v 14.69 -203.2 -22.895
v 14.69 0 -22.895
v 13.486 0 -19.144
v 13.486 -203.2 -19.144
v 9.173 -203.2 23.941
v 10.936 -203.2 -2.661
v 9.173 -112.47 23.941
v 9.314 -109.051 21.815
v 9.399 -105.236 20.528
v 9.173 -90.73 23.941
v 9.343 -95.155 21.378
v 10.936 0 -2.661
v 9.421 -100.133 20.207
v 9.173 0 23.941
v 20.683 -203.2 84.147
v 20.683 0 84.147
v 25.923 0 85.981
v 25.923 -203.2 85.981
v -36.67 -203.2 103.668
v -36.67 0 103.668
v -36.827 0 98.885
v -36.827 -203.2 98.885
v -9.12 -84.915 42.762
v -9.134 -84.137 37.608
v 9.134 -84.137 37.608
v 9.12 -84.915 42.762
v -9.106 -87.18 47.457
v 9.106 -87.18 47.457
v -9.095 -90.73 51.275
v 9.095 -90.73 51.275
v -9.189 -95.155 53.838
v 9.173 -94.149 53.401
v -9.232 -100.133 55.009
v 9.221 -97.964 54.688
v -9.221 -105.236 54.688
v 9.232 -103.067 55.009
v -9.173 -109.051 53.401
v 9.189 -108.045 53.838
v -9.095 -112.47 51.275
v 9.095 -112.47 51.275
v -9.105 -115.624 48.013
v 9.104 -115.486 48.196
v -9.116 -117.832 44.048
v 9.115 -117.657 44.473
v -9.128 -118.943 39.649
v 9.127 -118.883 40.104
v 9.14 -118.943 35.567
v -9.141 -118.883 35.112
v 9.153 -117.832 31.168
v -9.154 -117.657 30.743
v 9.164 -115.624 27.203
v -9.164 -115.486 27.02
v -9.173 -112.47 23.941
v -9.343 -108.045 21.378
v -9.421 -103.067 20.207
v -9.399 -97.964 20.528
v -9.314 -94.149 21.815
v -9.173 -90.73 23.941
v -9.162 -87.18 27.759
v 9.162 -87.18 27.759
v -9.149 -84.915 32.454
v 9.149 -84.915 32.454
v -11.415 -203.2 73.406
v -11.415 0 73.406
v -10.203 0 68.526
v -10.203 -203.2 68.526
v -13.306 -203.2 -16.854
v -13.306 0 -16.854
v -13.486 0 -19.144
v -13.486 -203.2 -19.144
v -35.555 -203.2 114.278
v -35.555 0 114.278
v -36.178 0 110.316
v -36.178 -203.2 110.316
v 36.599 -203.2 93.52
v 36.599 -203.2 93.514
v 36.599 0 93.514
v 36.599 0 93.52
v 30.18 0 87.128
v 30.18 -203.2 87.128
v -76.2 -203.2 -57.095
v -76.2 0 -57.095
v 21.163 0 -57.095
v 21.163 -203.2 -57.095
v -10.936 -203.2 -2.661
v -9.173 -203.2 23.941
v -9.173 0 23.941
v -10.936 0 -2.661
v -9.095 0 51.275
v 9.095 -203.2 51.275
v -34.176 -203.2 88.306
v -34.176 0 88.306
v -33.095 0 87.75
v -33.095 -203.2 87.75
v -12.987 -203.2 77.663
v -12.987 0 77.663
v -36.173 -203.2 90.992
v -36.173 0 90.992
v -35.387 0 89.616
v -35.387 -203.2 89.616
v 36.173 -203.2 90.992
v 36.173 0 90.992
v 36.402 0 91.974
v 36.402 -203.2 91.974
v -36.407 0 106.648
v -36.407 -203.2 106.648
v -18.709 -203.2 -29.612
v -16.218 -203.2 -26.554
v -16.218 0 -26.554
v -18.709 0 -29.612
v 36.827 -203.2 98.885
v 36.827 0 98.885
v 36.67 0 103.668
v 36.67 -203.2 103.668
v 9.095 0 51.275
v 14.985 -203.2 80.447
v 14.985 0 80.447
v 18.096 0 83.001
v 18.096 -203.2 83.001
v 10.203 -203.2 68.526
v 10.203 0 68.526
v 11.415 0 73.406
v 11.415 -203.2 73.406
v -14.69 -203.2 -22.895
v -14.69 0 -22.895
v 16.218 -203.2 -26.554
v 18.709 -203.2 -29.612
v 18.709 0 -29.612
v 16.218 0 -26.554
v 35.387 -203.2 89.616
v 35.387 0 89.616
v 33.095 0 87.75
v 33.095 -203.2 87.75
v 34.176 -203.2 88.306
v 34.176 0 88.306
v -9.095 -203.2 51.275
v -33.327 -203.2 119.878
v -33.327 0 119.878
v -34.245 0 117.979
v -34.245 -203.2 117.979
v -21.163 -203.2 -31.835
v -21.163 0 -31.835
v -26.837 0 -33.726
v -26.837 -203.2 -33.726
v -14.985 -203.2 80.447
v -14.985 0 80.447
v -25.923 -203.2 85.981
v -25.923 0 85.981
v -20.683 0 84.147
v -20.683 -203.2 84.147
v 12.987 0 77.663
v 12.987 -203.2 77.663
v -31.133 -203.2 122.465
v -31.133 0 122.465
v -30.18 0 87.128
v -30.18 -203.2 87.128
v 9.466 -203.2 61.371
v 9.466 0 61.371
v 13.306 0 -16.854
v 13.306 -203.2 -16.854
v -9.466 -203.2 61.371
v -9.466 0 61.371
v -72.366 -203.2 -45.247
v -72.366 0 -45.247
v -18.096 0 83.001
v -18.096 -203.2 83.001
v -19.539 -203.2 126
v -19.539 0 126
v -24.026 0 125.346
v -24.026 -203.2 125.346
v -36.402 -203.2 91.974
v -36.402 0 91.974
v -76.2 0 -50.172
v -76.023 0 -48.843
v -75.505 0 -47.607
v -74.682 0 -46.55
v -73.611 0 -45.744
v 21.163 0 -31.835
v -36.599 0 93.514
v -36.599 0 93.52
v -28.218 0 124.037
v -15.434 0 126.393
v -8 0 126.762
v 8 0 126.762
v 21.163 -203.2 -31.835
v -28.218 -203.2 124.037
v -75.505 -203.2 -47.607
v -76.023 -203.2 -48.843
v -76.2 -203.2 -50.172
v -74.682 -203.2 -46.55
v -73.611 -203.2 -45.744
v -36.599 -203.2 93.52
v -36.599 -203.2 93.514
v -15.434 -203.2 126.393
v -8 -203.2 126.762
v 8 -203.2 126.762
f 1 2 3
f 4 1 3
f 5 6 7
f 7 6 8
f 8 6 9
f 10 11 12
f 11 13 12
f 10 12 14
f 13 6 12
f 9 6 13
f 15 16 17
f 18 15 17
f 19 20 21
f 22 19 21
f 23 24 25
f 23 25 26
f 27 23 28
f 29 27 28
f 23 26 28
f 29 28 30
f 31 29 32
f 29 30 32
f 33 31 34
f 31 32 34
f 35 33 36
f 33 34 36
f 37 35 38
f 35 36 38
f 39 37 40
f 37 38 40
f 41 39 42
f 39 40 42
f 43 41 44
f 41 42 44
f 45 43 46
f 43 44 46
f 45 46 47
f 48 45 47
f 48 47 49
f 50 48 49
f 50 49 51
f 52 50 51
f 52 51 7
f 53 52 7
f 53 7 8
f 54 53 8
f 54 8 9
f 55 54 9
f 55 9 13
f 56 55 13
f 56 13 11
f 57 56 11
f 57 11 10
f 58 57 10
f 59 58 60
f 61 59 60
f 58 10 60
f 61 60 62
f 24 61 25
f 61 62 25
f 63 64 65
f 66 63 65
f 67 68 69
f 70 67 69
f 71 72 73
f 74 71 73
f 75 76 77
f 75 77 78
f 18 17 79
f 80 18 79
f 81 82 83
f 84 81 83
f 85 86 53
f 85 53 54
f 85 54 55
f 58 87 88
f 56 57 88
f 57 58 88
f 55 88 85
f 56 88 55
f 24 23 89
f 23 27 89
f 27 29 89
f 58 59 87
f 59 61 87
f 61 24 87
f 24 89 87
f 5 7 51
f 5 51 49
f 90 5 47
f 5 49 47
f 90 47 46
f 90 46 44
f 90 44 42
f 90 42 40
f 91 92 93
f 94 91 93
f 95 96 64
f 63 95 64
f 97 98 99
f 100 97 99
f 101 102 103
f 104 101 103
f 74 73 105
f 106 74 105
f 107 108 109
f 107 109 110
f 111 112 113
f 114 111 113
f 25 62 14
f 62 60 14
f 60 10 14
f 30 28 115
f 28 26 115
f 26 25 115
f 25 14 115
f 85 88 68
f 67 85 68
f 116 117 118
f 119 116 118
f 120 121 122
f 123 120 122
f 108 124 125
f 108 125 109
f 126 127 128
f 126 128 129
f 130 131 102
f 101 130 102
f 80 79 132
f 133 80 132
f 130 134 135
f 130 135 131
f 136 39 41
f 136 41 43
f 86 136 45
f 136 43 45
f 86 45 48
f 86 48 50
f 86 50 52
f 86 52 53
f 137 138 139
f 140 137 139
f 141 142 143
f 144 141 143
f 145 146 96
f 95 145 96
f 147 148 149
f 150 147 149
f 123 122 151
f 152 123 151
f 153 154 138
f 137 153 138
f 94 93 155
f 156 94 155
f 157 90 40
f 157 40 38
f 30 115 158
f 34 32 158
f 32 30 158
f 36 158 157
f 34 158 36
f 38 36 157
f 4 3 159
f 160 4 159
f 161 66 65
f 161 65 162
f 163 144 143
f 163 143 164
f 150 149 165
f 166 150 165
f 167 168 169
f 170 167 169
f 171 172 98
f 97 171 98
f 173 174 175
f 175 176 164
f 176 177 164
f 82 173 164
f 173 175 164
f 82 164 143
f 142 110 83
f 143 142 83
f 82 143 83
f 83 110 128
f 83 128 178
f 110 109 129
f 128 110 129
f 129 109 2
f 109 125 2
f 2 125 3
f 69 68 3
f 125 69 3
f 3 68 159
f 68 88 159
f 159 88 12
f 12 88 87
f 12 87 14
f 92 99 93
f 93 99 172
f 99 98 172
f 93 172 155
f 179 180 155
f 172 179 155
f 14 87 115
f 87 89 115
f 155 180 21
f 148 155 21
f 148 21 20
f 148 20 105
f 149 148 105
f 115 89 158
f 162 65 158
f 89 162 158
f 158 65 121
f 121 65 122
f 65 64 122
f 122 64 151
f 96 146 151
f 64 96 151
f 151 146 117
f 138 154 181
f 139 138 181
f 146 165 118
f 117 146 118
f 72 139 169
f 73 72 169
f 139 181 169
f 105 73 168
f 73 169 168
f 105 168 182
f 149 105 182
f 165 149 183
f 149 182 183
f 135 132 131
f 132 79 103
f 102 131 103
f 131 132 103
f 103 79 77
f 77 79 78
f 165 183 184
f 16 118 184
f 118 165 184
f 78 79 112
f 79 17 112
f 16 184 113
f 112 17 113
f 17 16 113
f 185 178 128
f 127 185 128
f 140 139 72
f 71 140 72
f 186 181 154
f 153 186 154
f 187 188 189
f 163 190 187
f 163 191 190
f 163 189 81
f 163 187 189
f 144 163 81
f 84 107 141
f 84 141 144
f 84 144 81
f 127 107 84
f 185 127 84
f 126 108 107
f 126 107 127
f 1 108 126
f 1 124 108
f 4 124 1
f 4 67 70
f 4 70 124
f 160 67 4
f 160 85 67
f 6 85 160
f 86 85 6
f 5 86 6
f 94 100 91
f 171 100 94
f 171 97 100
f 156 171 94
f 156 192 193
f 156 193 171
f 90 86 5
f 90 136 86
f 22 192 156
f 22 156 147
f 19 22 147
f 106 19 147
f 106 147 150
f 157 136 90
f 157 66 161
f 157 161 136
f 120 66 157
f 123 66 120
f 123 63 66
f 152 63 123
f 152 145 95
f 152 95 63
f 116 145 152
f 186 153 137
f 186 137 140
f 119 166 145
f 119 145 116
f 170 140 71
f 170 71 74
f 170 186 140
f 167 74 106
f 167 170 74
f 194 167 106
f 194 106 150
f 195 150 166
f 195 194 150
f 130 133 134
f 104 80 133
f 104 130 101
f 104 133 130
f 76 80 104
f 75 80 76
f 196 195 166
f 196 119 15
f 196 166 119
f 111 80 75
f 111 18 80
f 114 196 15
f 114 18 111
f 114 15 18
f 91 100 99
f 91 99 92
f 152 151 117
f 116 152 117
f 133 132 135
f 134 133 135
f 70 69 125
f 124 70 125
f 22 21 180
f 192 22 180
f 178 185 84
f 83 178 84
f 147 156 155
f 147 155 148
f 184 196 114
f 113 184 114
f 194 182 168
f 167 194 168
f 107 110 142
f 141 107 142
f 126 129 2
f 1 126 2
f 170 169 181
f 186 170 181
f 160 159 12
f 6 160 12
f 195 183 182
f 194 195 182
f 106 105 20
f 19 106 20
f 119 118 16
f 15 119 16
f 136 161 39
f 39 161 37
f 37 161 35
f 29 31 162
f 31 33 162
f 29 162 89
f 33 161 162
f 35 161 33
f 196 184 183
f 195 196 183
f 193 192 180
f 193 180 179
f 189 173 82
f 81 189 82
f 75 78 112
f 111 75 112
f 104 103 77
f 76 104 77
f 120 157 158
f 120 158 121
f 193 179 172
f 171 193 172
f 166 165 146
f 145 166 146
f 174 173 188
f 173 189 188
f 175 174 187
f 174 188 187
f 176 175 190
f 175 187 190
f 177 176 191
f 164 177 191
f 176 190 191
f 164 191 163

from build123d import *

# Parameters (mm, degrees)
F1_DEPTH = 203.2
F2_R     = 5.08
F4_DEPTH = 508
F5_R     = 17.4625
F6_DEPTH = 152.4
F8_DEPTH = 508


with BuildPart() as f1:
    # F0 (on Front) → F1 (new body)
    with BuildSketch(Plane.XZ):
        Polygon((-76.2, -46.21704), (-76.2, -57.094753), (76.2, -57.094753), (76.2, -46.21704), (26.83735, -33.72637), (21.163462, -31.835258), (18.708812, -29.612178), (16.218112, -26.55388), (14.689744, -22.895062), (13.485576, -19.143616), (13.305501, -16.85449), (10.935693, -2.660843), (9.173225, 23.941404), (9.095304, 51.274587), (9.465817, 61.371074), (10.203332, 68.52603), (11.415046, 73.405639), (12.987001, 77.66302), (14.984693, 80.446691), (18.095852, 83.001115), (20.683027, 84.147327), (25.922873, 85.98128), (30.180251, 87.1275), (33.094916, 87.749728), (34.175634, 88.306465), (35.387348, 89.616426), (36.173157, 90.991981), (36.40228, 91.97448), (36.598587, 93.513711), (36.598872, 93.52041), (36.827176, 98.88458), (36.669851, 103.667696), (36.407496, 106.64783), (36.177806, 110.315693), (35.555092, 114.278253), (34.24468, 117.978737), (33.327476, 119.878062), (31.132972, 122.464971), (28.218115, 124.036569), (24.026078, 125.34602), (19.539378, 126.000454), (15.433662, 126.392808), (7.999516, 126.762047), (0, 126.762047), (-7.999516, 126.762047), (-15.433662, 126.392808), (-19.539378, 126.000454), (-24.026078, 125.34602), (-28.218115, 124.036569), (-31.132972, 122.464971), (-33.327476, 119.878062), (-34.24468, 117.978737), (-35.555092, 114.278253), (-36.177806, 110.315693), (-36.407496, 106.64783), (-36.669851, 103.667696), (-36.827176, 98.88458), (-36.598872, 93.52041), (-36.598587, 93.513711), (-36.40228, 91.97448), (-36.173157, 90.991981), (-35.387348, 89.616426), (-34.175634, 88.306465), (-33.094916, 87.749728), (-30.180251, 87.1275), (-25.922873, 85.98128), (-20.683027, 84.147327), (-18.095852, 83.001115), (-14.984693, 80.446691), (-12.987001, 77.66302), (-11.415046, 73.405639), (-10.203332, 68.52603), (-9.465817, 61.371074), (-9.095304, 51.274587), (-9.173225, 23.941404), (-10.935693, -2.660843), (-13.305501, -16.85449), (-13.485576, -19.143616), (-14.689744, -22.895062), (-16.218112, -26.55388), (-18.708812, -29.612178), (-21.163462, -31.835258), (-26.83735, -33.72637), align=None)
    extrude(amount=F1_DEPTH)

    # F2
    f2_edges = [f1.edges().sort_by_distance(p)[0] for p in [
        (76.2, -101.6, -46.21704),
        (-76.2, -101.6, -46.21704),
    ]]
    fillet(f2_edges, radius=F2_R)

    # F3 (on face) → F4 (cut)
    with BuildSketch(Plane.XZ.offset(203.2)):
        with BuildLine():
            Line((26.83735, -33.72637), (21.163462, -31.835258))
            Line((21.163462, -31.835258), (21.163462, -57.094753))
            Line((21.163462, -57.094753), (76.2, -57.094753))
            Line((76.2, -57.094753), (76.2, -50.171713))
            ThreePointArc((76.2, -50.171713), (75.128547, -47.051144), (72.366162, -45.24693))
            Line((72.366162, -45.24693), (26.83735, -33.72637))
        make_face()
    extrude(amount=-F4_DEPTH, mode=Mode.SUBTRACT)

    # F5 (on Right) → F6 (cut, symmetric)
    with BuildSketch(Plane.YZ):
        with Locations((-101.6, 37.607995)):
            Circle(F5_R)
    extrude(amount=F6_DEPTH, both=True, mode=Mode.SUBTRACT)

    # F7 (on face) → F8 (cut)
    with BuildSketch(Plane.XZ.offset(203.2)):
        Polygon((15.433662, 126.392808), (7.999516, 126.762047), (36.669851, 103.667696), (36.407496, 106.64783), (36.177806, 110.315693), (35.555092, 114.278253), (34.24468, 117.978737), (33.327476, 119.878062), (31.132972, 122.464971), (28.218115, 124.036569), (24.026078, 125.34602), (19.539378, 126.000454), align=None)
    extrude(amount=-F8_DEPTH, mode=Mode.SUBTRACT)


solid = f1.part
